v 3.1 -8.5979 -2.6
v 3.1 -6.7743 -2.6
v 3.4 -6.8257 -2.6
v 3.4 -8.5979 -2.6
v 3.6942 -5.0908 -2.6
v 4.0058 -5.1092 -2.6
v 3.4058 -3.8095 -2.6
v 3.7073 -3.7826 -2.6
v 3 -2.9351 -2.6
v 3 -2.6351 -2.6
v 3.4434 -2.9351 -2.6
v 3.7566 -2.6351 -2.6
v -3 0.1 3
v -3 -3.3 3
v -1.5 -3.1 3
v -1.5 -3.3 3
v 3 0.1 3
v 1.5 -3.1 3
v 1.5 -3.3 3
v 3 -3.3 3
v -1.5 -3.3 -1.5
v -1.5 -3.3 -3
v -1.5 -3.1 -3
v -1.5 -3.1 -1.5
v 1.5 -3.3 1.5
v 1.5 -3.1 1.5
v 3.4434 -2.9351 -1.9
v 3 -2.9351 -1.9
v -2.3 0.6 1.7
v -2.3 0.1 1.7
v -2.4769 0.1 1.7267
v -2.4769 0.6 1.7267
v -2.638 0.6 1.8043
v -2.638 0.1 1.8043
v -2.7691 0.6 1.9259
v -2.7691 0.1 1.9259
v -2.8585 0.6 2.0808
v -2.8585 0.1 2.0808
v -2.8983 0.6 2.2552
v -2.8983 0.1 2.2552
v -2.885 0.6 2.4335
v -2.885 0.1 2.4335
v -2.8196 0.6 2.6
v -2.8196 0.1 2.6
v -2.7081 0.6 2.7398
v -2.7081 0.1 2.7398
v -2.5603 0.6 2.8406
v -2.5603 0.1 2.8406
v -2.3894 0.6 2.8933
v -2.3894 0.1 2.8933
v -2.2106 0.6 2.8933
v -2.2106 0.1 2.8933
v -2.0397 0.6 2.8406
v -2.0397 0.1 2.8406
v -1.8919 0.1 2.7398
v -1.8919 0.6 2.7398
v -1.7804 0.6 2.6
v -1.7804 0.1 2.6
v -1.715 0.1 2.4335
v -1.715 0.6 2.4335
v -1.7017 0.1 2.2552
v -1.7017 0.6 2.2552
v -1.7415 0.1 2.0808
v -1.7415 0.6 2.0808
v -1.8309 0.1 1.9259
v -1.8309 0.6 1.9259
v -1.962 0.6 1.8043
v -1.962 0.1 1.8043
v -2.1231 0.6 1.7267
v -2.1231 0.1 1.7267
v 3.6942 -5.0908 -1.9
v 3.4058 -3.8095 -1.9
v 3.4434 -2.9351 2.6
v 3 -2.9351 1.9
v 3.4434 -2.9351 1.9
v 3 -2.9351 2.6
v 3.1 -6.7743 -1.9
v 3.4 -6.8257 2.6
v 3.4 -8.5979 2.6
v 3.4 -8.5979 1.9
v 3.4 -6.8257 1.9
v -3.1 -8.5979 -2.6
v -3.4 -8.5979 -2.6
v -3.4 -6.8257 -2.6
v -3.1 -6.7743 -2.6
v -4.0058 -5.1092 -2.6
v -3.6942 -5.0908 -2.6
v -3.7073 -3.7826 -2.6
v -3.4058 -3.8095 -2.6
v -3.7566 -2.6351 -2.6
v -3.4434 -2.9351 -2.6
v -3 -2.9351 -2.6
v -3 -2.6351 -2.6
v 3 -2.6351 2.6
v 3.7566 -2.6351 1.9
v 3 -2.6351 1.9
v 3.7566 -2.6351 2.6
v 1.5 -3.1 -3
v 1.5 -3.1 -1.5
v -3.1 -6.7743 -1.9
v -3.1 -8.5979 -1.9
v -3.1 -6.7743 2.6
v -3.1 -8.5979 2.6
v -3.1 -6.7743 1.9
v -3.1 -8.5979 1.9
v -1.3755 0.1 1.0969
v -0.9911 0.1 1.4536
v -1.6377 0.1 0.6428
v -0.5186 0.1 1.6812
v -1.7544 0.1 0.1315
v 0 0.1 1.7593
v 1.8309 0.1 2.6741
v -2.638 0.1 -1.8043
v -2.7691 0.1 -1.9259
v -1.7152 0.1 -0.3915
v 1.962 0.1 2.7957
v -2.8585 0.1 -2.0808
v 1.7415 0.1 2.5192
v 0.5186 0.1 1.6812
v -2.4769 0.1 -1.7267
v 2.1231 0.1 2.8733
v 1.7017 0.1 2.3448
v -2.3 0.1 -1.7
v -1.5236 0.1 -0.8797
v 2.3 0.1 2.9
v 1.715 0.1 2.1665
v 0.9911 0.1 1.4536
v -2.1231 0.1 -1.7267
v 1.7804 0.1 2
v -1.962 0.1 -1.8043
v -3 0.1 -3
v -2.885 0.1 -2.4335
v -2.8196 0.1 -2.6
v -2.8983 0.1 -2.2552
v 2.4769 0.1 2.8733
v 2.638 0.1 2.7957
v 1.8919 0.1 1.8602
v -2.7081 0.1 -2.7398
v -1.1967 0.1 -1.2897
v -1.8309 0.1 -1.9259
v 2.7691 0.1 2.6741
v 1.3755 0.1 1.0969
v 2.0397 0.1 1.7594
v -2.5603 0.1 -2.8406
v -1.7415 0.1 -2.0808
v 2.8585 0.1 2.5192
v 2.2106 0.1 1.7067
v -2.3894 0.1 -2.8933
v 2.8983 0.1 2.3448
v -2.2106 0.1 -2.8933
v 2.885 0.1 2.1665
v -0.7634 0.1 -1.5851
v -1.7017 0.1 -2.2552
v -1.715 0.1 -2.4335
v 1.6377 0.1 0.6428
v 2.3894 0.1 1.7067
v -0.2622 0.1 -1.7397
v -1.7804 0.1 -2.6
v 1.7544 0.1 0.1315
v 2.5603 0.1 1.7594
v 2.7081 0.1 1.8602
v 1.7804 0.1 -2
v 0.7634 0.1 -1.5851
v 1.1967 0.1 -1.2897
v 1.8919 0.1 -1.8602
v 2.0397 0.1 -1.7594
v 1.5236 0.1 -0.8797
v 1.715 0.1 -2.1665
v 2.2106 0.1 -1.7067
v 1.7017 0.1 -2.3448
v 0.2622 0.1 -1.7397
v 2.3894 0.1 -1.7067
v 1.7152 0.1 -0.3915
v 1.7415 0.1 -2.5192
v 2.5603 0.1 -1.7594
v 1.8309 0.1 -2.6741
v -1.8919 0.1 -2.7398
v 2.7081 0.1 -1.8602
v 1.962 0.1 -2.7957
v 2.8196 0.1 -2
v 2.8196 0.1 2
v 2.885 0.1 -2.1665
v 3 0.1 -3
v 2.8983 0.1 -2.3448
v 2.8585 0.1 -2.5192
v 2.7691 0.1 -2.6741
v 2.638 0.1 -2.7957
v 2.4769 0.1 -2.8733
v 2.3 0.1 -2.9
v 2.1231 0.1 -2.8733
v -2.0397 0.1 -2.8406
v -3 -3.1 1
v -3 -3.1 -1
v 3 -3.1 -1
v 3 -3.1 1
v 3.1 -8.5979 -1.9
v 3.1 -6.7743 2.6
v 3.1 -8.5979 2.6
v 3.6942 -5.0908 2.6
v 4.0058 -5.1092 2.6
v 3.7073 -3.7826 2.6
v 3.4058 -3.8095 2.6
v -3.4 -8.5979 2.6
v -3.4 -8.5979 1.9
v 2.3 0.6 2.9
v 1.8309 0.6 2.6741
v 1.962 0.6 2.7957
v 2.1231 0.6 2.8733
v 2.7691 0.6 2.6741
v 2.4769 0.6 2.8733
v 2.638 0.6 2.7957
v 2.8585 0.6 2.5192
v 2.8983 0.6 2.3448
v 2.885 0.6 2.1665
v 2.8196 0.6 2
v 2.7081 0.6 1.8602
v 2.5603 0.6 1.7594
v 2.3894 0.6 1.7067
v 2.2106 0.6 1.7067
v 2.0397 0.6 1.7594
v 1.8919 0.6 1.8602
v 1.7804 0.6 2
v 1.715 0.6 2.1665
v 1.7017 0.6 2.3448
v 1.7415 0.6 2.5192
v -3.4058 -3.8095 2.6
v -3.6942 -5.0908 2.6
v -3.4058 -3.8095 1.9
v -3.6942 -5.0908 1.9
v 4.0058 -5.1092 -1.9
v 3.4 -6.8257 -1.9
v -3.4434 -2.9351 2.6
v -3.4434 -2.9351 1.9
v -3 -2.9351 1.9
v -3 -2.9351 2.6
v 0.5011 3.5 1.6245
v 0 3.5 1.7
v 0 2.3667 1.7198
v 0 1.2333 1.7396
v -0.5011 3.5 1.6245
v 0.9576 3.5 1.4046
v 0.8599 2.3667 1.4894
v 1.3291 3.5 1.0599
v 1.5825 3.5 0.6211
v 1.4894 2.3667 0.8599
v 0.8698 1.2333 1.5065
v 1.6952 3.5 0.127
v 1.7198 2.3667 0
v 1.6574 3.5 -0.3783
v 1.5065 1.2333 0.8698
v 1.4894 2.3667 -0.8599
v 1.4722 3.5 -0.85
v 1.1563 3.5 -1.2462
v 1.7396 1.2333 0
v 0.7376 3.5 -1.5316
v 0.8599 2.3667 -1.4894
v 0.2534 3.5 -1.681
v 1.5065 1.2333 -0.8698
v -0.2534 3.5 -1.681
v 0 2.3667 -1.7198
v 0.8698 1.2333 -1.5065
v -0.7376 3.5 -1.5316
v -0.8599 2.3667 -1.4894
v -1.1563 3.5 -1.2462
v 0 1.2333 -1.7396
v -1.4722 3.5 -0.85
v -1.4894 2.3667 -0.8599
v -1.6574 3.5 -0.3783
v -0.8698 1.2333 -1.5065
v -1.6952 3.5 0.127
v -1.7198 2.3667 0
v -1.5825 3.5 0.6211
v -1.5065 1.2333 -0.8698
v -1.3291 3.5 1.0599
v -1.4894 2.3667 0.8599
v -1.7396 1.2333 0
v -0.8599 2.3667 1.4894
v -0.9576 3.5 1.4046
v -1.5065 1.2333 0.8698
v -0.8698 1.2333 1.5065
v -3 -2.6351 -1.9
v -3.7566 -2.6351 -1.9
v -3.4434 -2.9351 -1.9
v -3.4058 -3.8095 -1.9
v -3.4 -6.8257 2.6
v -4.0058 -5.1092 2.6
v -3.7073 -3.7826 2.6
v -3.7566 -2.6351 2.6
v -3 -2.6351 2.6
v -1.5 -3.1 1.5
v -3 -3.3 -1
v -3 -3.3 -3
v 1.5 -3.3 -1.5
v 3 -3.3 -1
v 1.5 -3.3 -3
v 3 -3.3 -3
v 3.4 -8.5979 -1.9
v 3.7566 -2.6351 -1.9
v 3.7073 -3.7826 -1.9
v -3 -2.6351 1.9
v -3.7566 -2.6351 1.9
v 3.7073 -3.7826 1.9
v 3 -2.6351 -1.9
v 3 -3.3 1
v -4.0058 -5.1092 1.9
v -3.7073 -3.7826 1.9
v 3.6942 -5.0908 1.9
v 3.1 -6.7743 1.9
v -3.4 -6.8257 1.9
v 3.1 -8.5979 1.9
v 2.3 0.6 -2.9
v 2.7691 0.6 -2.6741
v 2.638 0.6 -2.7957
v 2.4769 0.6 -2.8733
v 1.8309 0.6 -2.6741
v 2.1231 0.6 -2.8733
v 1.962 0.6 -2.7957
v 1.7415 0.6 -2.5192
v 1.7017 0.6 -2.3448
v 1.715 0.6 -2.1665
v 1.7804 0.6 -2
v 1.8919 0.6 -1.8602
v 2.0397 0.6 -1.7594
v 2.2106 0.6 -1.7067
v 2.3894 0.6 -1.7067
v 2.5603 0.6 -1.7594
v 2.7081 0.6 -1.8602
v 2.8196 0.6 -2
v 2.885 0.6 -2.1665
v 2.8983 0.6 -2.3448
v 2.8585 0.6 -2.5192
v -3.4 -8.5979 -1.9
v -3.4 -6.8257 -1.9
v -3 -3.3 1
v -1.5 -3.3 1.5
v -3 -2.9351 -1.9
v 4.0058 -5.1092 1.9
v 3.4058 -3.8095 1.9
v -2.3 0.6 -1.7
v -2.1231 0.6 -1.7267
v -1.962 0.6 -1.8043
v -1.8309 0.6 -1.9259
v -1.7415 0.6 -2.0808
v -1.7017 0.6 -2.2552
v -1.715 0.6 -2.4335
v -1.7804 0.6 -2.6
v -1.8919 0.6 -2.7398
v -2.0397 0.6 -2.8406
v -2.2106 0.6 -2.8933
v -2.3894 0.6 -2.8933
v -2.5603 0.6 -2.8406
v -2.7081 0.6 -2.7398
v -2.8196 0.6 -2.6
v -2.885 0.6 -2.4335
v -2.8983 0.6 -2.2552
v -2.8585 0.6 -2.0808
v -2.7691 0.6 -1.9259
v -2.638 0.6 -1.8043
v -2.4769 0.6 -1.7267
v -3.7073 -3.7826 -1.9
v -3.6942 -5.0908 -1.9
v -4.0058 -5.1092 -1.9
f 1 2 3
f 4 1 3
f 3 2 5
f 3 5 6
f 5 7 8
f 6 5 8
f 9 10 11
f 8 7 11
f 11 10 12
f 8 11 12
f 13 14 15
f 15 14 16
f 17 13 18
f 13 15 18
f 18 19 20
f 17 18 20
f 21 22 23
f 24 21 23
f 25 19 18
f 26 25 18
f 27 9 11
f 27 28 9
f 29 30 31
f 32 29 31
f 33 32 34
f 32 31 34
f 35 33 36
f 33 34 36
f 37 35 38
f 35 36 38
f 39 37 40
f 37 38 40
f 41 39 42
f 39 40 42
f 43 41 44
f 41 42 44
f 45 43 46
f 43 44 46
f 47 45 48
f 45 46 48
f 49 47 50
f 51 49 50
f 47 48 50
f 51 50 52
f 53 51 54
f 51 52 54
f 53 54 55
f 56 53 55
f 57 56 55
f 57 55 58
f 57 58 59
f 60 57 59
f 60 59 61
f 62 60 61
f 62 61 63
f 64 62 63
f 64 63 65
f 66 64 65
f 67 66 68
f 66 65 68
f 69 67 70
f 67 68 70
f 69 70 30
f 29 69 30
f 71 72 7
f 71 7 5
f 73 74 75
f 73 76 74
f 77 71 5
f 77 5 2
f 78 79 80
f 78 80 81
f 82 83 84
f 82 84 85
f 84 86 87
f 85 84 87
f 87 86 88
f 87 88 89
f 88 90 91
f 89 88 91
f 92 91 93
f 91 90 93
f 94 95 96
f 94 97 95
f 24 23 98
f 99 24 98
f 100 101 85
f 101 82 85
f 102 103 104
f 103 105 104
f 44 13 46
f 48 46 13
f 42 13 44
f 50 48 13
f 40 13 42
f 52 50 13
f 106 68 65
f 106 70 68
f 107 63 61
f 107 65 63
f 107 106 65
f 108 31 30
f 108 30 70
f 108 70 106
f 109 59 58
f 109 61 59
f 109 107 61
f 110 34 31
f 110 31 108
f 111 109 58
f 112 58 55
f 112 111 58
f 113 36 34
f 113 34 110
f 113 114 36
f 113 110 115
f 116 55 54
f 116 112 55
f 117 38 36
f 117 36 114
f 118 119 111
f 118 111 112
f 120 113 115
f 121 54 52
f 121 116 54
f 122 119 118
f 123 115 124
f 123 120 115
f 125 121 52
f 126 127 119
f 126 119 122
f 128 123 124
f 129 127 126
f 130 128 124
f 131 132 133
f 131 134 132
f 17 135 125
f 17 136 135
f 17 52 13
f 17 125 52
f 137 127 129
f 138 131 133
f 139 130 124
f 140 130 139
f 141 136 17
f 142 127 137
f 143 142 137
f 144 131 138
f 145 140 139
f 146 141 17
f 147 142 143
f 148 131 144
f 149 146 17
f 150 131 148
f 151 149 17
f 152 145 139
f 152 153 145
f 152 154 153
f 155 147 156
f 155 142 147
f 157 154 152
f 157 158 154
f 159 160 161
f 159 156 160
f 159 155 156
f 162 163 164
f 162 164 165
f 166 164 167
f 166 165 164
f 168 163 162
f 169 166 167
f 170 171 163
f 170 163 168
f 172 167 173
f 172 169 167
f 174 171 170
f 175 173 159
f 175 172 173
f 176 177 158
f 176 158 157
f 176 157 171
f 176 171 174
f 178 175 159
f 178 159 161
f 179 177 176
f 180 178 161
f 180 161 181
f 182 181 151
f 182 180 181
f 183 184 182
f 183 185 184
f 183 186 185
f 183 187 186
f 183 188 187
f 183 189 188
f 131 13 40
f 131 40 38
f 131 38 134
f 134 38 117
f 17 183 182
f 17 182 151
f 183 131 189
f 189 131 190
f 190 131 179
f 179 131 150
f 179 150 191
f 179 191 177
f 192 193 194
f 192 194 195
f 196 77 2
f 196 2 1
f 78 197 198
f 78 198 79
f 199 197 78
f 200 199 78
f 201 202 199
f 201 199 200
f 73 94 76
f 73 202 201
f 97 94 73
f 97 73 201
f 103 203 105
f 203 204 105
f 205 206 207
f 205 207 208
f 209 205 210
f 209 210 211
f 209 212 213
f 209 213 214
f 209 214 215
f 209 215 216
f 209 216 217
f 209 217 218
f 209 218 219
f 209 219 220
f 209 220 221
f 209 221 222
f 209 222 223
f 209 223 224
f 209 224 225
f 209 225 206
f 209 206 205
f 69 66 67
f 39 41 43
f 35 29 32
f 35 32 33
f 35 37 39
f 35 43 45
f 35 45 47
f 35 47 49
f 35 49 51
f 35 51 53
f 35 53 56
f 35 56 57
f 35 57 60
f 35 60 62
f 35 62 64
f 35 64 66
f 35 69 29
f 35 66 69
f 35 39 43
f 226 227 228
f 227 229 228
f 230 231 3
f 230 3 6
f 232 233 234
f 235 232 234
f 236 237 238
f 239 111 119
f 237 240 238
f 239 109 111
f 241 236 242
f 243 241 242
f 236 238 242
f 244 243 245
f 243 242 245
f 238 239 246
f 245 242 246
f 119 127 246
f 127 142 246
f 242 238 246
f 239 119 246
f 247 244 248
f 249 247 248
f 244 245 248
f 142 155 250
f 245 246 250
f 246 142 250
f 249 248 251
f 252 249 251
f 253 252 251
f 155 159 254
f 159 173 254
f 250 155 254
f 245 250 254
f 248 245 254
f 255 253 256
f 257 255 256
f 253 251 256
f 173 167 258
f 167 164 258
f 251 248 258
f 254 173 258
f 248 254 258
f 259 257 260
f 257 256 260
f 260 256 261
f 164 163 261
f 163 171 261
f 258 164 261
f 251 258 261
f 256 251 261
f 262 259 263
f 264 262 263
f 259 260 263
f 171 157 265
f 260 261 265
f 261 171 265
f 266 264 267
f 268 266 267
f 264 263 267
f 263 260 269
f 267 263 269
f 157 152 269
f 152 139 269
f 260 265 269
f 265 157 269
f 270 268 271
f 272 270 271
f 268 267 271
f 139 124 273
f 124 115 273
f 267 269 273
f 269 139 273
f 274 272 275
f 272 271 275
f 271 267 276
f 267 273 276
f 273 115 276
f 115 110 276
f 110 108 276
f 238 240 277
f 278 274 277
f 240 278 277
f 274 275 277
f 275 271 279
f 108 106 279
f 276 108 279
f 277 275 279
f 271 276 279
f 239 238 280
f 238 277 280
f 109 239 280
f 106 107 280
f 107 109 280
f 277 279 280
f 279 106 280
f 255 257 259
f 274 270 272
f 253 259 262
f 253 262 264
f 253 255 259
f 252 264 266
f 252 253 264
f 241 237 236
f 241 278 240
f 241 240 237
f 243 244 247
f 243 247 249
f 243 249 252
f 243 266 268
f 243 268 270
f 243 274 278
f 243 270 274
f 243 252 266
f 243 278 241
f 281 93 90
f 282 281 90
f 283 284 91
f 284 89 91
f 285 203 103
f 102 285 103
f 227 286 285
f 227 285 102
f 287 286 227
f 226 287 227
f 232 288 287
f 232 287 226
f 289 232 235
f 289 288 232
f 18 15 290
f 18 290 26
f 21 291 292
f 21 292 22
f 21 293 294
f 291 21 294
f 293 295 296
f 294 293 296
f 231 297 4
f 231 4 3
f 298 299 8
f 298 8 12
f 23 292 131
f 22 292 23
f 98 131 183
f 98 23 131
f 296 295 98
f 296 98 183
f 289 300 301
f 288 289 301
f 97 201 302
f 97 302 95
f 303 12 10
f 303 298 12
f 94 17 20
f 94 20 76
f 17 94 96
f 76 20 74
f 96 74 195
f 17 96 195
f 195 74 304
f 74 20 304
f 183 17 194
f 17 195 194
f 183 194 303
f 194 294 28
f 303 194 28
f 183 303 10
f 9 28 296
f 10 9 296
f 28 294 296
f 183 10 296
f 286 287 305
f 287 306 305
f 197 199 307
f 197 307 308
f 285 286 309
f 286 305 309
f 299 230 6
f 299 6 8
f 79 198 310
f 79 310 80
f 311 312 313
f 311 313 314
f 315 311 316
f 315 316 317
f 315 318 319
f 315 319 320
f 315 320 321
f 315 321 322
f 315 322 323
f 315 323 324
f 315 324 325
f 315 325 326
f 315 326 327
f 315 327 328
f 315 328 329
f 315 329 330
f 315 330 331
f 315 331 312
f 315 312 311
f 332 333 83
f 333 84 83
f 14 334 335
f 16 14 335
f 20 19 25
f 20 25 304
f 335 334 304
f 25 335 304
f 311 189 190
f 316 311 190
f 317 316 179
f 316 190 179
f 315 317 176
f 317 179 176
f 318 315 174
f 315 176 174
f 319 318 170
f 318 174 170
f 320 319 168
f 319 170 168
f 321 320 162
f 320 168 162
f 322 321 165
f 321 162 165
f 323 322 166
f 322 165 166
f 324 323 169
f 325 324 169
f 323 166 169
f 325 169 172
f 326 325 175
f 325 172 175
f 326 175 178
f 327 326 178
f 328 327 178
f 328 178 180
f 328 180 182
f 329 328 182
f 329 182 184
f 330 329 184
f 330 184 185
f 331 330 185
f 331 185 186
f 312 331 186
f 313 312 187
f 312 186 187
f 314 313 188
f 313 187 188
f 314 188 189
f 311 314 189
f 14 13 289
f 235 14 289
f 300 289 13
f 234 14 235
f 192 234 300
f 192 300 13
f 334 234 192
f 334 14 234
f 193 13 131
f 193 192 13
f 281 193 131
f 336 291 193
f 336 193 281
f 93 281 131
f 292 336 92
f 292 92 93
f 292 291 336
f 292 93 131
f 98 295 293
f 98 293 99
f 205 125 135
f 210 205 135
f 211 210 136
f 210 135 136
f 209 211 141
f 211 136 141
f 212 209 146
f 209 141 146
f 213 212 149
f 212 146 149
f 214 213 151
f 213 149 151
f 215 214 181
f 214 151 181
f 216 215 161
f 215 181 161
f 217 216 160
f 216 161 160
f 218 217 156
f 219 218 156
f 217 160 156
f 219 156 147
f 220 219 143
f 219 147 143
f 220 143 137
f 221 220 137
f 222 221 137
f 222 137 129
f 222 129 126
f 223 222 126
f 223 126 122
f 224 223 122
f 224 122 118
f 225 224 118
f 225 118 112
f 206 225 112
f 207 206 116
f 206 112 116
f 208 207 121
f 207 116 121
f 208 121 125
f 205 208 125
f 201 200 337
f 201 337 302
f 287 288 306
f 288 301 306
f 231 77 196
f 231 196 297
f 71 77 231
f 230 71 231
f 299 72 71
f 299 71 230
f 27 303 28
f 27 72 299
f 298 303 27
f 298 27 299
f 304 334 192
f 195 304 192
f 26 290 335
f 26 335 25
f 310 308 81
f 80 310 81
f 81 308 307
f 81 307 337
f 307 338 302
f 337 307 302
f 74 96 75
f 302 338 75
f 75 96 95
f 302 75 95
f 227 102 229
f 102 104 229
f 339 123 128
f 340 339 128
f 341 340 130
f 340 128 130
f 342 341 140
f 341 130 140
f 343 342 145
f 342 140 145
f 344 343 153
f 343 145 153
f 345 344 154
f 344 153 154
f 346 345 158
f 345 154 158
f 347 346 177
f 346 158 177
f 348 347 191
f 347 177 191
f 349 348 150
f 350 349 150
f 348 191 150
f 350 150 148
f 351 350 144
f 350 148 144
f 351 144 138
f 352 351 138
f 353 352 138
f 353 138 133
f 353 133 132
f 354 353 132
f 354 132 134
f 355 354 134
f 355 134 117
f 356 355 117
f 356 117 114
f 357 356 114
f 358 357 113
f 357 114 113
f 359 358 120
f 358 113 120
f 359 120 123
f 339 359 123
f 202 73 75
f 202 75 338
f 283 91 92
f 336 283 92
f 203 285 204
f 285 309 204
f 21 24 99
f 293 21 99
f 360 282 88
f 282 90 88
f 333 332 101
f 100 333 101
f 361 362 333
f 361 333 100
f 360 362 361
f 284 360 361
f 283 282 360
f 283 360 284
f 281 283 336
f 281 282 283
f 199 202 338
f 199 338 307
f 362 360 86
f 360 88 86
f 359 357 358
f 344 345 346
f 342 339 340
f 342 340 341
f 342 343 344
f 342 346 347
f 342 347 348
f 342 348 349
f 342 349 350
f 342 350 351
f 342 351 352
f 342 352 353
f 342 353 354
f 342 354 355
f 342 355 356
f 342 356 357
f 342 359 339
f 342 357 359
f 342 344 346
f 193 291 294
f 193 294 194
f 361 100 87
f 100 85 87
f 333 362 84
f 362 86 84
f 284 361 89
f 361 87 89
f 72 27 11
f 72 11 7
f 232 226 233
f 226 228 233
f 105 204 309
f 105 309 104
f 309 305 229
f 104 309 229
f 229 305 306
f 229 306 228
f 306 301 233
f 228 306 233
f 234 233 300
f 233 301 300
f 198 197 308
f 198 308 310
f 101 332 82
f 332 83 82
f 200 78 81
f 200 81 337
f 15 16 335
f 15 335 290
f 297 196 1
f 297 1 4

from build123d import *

# Parameters (mm, degrees)
IZIM1_W                     = 6
IZIM1_H                     = 6
Y_KSEKLIK_EKSTR_ZYON1_DEPTH = 3.3
IZIM2_W                     = 6
IZIM2_H                     = 6
Y_KSEKLIK_EKSTR_ZYON2_DEPTH = 0.1
IZIM3_W                     = 3
IZIM3_H                     = 0.2
KES_EKSTR_ZYON1_DEPTH       = 1.5
IZIM4_W                     = 2
IZIM4_H                     = 0.2
KES_EKSTR_ZYON2_DEPTH       = 8.475961477
IZIM5_R                     = 1.7
Y_KSEKLIK_EKSTR_ZYON3_DEPTH = 3.4
DRAFT4_ANGLE                = 1
IZIM6_R                     = 0.6
Y_KSEKLIK_EKSTR_ZYON4_DEPTH = 0.5
Y_KSEKLIK_EKSTR_ZYON5_DEPTH = 0.35
L_O_ALTMA1_COUNT            = 2
L_O_ALTMA1_PITCH            = 4.5


with BuildPart() as part:
    # Çizim1 → Yükseklik-Ekstrüzyon1 (new body)
    with BuildSketch(Plane(origin=(0, 0, 0), x_dir=(1, 0, 0), z_dir=(0, 1, 0))):
        Rectangle(IZIM1_W, IZIM1_H)
    extrude(amount=-Y_KSEKLIK_EKSTR_ZYON1_DEPTH)

    # Çizim2 → Yükseklik-Ekstrüzyon2 (add)
    with BuildSketch(Plane(origin=(0, 0, 0), x_dir=(1, 0, 0), z_dir=(0, 1, 0))):
        Rectangle(IZIM2_W, IZIM2_H)
    extrude(amount=Y_KSEKLIK_EKSTR_ZYON2_DEPTH)

    # Çizim3 → Kes-Ekstrüzyon1 (cut)
    with BuildSketch(Plane.XY.offset(3)):
        with Locations((0, -3.2)):
            Rectangle(IZIM3_W, IZIM3_H)
    kes_ekstr_zyon1 = extrude(amount=-KES_EKSTR_ZYON1_DEPTH, mode=Mode.SUBTRACT)

    # Aynalama1: Kes-Ekstrüzyon1 across plane
    add(kes_ekstr_zyon1.mirror(Plane.XY), mode=Mode.SUBTRACT)

    # Çizim4 → Kes-Ekstrüzyon2 (cut, through all)
    with BuildSketch(Plane.ZY.offset(3)):
        with Locations((0, -3.2)):
            Rectangle(IZIM4_W, IZIM4_H)
    extrude(amount=-KES_EKSTR_ZYON2_DEPTH, mode=Mode.SUBTRACT)

    # Çizim5 → Yükseklik-Ekstrüzyon3 (add)
    with BuildSketch(Plane(origin=(0, 0.1, 0), x_dir=(1, 0, 0), z_dir=(0, 1, 0))):
        with Locations(Location((0, 0, 0), (0, 0, 270))):
            Circle(IZIM5_R)
    extrude(amount=Y_KSEKLIK_EKSTR_ZYON3_DEPTH)

    # Draft4
    draft4_faces = [part.faces().sort_by_distance(p)[0] for p in [
        (0, 1.8, -1.7),
    ]]
    draft(draft4_faces, Plane.ZX.offset(3.5), DRAFT4_ANGLE)

    # Çizim6 → Yükseklik-Ekstrüzyon4 (add)
    with BuildSketch(Plane(origin=(0, 0.1, 0), x_dir=(1, 0, 0), z_dir=(0, 1, 0))):
        with Locations(Location((-2.3, 2.3, 0), (0, 0, 270))):
            Circle(IZIM6_R)
        with Locations(Location((2.3, 2.3, 0), (0, 0, 90))):
            Circle(IZIM6_R)
        with Locations(Location((2.3, -2.3, 0), (0, 0, 270))):
            Circle(IZIM6_R)
        with Locations(Location((-2.3, -2.3, 0), (0, 0, 90))):
            Circle(IZIM6_R)
    extrude(amount=Y_KSEKLIK_EKSTR_ZYON4_DEPTH)

    # Çizim8 → Yükseklik-Ekstrüzyon5 (add, symmetric)
    with BuildSketch(Plane.XY.offset(2.25)):
        Polygon((-3, -2.63511714), (-3.756588195, -2.63511714), (-3.70725074, -3.782570711), (-4.005822093, -5.10919798), (-3.4, -6.825693909), (-3.4, -8.597874756), (-3.1, -8.597874756), (-3.1, -6.774306091), (-3.694177907, -5.09080202), (-3.405814351, -3.809530548), (-3.443411805, -2.93511714), (-3, -2.93511714), align=None)
        Polygon((3, -2.93511714), (3.443411805, -2.93511714), (3.405814351, -3.809530548), (3.694177907, -5.09080202), (3.1, -6.774306091), (3.1, -8.597874756), (3.4, -8.597874756), (3.4, -6.825693909), (4.005822093, -5.10919798), (3.70725074, -3.782570711), (3.756588195, -2.63511714), (3, -2.63511714), align=None)
    y_kseklik_ekstr_zyon5 = extrude(amount=Y_KSEKLIK_EKSTR_ZYON5_DEPTH, both=True)

    # LÇoğaltma1: Yükseklik-Ekstrüzyon5 ×2
    with Locations(*[(0, 0, -i * L_O_ALTMA1_PITCH) for i in range(1, L_O_ALTMA1_COUNT)]):
        add(y_kseklik_ekstr_zyon5)


solid = part.part
